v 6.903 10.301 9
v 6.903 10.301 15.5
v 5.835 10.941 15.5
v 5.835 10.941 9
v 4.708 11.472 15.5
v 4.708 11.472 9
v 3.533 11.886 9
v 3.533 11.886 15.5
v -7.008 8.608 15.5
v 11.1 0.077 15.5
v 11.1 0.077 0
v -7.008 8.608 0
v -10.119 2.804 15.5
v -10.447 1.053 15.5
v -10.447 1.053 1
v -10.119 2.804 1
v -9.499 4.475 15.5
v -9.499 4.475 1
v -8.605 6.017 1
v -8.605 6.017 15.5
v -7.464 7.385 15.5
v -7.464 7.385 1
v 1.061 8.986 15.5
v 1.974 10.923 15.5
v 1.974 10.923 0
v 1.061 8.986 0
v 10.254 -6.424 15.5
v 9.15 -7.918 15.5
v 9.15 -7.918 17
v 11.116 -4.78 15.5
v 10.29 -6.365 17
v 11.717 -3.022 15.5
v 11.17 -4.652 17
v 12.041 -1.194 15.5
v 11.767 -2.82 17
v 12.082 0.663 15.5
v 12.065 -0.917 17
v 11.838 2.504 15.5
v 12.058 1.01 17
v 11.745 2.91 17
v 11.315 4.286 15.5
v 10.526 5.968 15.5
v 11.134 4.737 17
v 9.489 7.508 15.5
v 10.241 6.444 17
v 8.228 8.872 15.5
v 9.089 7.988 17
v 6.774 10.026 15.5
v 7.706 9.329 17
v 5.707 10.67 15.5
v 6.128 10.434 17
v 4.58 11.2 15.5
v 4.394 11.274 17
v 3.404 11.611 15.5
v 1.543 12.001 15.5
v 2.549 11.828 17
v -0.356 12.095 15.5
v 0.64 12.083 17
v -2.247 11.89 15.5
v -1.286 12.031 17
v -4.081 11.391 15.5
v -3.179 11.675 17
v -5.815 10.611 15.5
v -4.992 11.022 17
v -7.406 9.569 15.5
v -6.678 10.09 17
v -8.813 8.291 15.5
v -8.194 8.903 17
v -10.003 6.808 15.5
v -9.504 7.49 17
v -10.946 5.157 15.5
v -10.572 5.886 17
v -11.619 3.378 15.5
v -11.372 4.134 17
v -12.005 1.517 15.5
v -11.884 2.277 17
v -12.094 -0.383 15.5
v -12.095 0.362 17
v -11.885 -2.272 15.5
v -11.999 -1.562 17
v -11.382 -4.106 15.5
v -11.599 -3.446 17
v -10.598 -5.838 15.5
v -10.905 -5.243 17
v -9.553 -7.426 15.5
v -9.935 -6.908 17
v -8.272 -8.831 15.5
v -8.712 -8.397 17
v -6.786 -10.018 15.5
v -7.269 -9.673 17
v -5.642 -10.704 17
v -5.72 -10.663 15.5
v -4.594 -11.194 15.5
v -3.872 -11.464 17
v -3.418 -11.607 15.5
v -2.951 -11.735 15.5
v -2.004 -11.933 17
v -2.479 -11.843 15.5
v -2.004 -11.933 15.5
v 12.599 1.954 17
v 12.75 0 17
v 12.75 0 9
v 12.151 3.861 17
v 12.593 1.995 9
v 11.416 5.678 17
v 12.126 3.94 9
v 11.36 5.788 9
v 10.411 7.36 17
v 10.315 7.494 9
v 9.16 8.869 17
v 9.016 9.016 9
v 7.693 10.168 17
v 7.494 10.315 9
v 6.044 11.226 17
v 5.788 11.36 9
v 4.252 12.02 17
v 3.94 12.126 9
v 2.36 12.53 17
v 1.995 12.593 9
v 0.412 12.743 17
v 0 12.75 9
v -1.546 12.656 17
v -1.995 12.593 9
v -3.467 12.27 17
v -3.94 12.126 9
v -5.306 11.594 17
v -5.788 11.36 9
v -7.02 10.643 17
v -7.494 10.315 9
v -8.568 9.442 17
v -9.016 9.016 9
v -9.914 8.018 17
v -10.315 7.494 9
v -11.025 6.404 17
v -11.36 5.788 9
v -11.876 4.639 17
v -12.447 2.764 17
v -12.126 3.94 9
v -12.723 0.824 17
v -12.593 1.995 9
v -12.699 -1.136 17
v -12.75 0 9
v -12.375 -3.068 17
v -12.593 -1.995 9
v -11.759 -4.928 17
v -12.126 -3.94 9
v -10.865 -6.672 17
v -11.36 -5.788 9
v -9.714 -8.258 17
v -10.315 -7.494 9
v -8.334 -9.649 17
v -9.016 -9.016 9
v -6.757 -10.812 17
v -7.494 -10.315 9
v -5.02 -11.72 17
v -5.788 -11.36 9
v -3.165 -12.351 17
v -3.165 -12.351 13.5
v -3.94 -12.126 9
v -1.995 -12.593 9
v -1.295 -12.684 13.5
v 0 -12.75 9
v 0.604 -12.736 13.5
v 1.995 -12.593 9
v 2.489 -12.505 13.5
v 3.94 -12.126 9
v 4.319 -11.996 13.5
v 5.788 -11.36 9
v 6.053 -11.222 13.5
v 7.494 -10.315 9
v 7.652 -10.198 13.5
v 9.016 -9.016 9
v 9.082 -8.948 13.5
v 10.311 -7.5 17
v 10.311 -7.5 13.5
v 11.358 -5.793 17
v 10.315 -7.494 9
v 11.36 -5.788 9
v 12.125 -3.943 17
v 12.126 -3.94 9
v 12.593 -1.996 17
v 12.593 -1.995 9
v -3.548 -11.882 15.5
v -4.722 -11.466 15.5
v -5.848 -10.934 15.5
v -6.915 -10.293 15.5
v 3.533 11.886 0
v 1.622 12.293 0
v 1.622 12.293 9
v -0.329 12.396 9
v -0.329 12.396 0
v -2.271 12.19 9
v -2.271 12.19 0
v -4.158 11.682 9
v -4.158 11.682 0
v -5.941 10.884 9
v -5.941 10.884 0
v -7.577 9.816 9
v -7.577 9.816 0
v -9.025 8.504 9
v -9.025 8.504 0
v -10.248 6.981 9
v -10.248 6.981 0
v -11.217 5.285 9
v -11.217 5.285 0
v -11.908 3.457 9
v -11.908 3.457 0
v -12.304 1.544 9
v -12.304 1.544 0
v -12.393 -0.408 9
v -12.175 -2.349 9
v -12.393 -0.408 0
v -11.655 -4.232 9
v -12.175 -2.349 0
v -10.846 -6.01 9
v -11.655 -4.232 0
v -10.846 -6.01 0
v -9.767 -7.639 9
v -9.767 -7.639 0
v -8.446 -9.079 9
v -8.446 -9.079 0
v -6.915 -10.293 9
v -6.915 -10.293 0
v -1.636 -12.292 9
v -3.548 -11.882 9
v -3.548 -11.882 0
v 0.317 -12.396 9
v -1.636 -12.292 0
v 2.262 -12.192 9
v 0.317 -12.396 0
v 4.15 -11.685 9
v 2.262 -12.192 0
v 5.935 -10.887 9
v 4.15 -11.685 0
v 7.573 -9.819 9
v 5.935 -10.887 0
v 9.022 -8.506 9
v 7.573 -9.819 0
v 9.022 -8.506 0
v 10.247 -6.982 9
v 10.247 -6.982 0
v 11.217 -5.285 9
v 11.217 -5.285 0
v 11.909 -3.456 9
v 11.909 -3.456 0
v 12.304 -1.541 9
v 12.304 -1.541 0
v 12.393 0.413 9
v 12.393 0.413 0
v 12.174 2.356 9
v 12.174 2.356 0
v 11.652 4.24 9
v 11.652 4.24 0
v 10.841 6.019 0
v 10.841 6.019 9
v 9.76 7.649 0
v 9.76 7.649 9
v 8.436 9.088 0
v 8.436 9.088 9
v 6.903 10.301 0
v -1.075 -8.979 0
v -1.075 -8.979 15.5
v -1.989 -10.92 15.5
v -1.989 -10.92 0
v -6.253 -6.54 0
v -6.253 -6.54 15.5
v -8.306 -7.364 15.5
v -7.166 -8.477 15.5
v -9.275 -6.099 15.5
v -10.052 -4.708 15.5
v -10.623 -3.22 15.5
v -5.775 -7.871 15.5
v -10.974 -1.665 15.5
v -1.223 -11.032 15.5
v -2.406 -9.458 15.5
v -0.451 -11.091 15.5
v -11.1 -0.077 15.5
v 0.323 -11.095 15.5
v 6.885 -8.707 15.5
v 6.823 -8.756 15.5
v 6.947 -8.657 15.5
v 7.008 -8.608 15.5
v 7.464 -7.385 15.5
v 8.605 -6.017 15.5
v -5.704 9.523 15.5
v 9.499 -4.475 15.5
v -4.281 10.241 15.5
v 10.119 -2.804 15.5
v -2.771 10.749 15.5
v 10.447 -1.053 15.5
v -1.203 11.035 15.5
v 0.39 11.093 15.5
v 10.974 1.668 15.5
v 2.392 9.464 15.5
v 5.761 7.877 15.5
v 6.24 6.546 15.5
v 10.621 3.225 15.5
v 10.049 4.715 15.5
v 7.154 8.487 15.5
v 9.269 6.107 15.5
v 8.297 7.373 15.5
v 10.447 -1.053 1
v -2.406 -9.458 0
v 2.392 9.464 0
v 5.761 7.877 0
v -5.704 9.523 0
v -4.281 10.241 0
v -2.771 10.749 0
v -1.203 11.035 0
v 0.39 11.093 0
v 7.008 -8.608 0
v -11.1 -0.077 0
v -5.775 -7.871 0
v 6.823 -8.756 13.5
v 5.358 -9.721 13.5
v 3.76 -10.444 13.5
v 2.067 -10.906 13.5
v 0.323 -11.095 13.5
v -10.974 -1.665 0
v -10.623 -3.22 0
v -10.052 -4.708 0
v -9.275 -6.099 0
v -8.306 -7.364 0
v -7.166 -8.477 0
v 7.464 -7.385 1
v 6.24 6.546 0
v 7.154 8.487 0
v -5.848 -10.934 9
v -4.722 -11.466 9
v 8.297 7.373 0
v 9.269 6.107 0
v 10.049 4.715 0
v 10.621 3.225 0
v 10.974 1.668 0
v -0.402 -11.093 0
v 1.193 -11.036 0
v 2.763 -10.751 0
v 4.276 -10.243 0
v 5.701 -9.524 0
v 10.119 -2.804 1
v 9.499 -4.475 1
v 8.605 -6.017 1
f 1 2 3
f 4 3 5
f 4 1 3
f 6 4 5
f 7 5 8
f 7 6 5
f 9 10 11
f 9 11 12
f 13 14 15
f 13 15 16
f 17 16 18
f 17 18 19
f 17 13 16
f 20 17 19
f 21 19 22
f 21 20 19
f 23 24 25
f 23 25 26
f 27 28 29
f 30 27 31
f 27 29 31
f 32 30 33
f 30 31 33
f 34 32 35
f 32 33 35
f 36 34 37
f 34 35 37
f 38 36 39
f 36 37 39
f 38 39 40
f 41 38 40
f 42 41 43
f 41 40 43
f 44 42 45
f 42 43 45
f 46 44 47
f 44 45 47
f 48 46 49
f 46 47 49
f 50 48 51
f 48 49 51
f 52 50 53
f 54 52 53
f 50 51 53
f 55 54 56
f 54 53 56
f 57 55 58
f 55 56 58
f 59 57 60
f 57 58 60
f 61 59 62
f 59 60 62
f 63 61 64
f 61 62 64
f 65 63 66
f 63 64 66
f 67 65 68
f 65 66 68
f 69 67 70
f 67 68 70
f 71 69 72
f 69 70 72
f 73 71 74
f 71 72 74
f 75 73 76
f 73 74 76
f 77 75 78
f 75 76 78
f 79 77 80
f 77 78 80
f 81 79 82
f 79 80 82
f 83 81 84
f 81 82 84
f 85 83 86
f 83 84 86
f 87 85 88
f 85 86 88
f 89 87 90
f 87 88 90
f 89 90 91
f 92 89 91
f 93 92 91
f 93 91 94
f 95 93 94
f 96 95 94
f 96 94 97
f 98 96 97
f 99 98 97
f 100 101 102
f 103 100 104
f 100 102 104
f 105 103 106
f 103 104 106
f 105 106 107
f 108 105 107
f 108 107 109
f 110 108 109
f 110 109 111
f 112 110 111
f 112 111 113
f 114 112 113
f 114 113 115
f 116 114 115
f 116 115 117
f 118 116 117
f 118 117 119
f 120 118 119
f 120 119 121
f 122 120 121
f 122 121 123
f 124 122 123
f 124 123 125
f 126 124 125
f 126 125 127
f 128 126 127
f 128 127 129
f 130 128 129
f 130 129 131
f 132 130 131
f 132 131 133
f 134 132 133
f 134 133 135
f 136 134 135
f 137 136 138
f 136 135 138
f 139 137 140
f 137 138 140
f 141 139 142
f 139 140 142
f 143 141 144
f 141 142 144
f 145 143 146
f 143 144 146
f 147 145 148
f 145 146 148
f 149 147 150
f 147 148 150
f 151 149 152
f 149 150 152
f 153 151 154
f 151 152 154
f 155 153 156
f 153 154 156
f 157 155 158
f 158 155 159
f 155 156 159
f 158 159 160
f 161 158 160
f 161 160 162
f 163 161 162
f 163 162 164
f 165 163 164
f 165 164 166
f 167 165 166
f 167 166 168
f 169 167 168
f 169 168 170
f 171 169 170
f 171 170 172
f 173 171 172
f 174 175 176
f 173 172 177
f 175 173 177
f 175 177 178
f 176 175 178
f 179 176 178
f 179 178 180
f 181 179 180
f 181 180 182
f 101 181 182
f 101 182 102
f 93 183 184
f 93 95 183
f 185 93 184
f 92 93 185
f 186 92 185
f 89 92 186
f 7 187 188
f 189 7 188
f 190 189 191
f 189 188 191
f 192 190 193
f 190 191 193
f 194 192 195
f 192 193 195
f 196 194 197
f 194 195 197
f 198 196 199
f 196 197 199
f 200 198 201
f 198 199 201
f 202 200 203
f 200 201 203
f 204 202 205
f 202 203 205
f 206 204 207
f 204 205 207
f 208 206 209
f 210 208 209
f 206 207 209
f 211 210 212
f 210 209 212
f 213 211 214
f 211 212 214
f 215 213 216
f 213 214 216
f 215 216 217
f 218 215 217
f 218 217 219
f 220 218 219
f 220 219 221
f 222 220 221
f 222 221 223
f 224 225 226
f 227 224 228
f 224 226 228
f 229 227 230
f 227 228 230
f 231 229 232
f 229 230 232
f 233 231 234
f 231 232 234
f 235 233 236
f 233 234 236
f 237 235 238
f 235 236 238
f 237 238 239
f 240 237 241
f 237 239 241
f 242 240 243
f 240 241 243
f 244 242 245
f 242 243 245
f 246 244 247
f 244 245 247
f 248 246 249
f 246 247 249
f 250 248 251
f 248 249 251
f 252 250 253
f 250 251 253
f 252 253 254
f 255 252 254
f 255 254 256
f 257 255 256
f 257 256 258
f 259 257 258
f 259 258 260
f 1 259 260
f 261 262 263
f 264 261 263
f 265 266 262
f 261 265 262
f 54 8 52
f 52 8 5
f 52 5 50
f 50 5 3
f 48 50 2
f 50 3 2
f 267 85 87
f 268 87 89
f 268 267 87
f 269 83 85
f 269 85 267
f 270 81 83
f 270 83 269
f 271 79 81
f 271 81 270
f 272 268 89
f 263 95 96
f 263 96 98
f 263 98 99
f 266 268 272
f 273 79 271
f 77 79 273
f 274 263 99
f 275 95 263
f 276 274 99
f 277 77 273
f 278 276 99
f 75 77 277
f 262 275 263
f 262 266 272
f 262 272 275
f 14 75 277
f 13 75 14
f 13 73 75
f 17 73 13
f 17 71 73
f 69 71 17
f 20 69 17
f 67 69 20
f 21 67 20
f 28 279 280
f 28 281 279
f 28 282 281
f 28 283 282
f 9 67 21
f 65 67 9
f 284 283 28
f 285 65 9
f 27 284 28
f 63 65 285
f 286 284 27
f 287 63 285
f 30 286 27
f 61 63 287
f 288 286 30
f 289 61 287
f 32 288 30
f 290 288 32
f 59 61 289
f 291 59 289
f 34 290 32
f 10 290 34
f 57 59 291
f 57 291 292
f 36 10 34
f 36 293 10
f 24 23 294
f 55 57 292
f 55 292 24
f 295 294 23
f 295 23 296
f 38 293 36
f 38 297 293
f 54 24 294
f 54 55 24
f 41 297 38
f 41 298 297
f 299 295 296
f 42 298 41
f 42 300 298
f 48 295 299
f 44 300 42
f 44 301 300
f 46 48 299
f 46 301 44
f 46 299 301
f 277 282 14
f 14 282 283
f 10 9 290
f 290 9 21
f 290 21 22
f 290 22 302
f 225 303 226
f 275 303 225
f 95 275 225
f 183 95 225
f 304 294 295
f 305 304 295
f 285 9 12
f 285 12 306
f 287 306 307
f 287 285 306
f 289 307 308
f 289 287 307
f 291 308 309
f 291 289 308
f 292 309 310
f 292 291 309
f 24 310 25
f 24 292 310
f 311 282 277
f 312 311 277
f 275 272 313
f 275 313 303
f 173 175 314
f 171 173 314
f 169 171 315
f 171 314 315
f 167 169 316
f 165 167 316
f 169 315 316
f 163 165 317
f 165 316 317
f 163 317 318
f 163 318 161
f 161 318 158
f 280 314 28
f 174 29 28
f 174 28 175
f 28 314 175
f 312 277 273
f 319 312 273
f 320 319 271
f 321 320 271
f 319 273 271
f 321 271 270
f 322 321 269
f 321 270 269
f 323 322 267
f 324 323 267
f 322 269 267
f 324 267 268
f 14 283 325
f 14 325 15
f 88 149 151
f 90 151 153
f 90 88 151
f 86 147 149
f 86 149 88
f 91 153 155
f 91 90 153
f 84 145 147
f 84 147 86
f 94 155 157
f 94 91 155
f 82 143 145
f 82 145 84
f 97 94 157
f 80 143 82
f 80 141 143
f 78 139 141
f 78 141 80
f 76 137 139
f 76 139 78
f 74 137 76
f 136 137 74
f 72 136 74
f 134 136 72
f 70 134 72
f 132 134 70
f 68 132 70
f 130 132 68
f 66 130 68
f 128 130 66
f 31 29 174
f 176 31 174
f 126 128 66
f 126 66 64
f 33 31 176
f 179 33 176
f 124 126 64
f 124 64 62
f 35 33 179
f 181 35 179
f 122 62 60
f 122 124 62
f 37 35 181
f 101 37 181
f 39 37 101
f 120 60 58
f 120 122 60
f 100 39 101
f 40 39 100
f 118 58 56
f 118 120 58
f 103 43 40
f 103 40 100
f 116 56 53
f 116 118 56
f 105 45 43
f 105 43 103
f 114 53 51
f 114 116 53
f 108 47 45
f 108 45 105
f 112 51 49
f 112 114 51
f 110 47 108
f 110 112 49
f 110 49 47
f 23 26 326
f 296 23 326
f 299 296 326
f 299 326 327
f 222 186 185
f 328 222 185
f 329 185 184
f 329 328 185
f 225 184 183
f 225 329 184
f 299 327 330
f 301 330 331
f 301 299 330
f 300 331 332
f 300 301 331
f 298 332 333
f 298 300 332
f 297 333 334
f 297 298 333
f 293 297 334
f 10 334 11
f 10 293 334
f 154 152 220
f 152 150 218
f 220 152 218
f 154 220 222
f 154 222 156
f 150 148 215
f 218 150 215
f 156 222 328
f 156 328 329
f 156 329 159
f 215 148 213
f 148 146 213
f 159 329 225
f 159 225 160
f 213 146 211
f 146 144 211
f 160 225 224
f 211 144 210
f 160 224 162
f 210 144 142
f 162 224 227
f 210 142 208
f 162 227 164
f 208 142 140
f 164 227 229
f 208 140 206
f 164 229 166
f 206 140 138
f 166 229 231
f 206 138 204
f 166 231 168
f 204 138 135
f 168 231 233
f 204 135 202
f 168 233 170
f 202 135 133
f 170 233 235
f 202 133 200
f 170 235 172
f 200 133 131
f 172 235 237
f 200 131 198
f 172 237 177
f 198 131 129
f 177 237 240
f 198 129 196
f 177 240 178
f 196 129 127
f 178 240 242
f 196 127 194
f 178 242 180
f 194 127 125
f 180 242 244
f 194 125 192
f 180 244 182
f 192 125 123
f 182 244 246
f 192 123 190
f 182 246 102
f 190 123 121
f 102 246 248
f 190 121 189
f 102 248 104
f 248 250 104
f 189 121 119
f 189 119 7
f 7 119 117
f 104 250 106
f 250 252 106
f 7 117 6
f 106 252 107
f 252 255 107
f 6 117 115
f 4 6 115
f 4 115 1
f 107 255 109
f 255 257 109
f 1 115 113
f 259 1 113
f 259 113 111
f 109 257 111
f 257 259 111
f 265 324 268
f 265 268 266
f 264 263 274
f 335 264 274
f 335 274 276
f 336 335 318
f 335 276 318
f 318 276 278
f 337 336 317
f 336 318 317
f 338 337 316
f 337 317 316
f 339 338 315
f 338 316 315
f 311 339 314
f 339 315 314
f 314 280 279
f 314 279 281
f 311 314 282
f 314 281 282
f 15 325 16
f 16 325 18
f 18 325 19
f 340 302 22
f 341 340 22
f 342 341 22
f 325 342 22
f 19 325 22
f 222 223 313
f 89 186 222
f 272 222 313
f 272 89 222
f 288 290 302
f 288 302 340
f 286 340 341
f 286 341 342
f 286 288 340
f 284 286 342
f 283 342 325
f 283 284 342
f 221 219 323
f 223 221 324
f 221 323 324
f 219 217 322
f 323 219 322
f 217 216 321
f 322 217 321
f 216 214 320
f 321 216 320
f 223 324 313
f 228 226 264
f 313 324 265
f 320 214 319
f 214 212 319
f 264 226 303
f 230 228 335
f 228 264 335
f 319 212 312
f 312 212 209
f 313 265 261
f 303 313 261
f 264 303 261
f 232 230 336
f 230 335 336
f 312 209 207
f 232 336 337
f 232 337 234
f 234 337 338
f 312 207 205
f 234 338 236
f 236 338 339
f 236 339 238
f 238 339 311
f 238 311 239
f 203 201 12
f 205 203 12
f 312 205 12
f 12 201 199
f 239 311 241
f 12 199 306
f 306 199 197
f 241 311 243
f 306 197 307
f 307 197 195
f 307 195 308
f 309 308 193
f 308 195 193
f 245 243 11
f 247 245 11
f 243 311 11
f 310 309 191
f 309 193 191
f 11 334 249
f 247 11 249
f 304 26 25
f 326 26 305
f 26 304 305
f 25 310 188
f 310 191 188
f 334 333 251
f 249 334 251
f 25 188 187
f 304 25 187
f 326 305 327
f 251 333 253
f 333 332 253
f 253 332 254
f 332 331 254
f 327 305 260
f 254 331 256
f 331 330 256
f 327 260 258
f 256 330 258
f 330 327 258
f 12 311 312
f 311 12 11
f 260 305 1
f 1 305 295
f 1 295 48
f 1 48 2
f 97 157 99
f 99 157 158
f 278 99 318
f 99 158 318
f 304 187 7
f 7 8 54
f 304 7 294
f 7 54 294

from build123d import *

# Parameters (mm, degrees)
SKETCH_1_R          = 12.4
EXTRUDE_1_DEPTH     = 17
SKETCH_2_R          = 12.1
CUT_EXTRUDE_1_DEPTH = 1.5
CUT_EXTRUDE_2_DEPTH = 24.404486749
EXTRUDE_START       = -8
SKETCH_4_R          = 12.75
SKETCH_4_R_2        = 12.4
EXTRUDE_2_DEPTH     = 8
CUT_EXTRUDE_3_DEPTH = 14.5
CUT_EXTRUDE_4_DEPTH = 24.777615524
CUT_EXTRUDE_START   = -3.5
CUT_EXTRUDE_5_DEPTH = 3.5


with BuildPart() as part:
    # 草图1 → 凸台-拉伸1 (new body)
    with BuildSketch(Plane.XY):
        Circle(SKETCH_1_R)
    extrude(amount=EXTRUDE_1_DEPTH)

    # 草图2 → 切除-拉伸1 (cut)
    with BuildSketch(Plane.XY.offset(17)):
        Circle(SKETCH_2_R)
    extrude(amount=-CUT_EXTRUDE_1_DEPTH, mode=Mode.SUBTRACT)

    # 草图3 → 切除-拉伸2 (cut, through all)
    with BuildSketch(Plane.XY.offset(15.5)):
        with BuildLine():
            Line((-6.915466109, -10.292537515), (-5.774584306, -7.870847726))
            Line((-5.774584306, -7.870847726), (-2.405724389, -9.457950665))
            Line((-2.405724389, -9.457950665), (-3.547574837, -11.881696544))
            ThreePointArc((-3.547574837, -11.881696544), (-5.291518031, -11.214269345), (-6.915466109, -10.292537515))
        make_face()
        with BuildLine():
            Line((5.761046975, 7.877225296), (6.902897424, 10.300971175))
            ThreePointArc((6.902897424, 10.300971175), (5.277825448, 11.220720055), (3.533068862, 11.886018022))
            Line((3.533068862, 11.886018022), (2.392187058, 9.464328234))
            Line((2.392187058, 9.464328234), (5.761046975, 7.877225296))
        make_face()
    extrude(amount=-CUT_EXTRUDE_2_DEPTH, mode=Mode.SUBTRACT)

    # 草图4 → 凸台-拉伸2 (add)
    with BuildSketch(Plane.XY.offset(17).offset(EXTRUDE_START)):
        Circle(SKETCH_4_R)
        Circle(SKETCH_4_R_2, mode=Mode.SUBTRACT)
    extrude(amount=EXTRUDE_2_DEPTH)

    # 草图5 → 切除-拉伸3 (cut)
    with BuildSketch(Plane.XY.offset(15.5)):
        with BuildLine():
            Line((-7.463806301, 7.385228195), (10.44708929, -1.05277033))
            ThreePointArc((10.44708929, -1.05277033), (9.498686797, -4.474924483), (7.463806301, -7.385228195))
            Line((7.463806301, -7.385228195), (-10.44708929, 1.05277033))
            ThreePointArc((-10.44708929, 1.05277033), (-9.498686797, 4.474924483), (-7.463806301, 7.385228195))
        make_face()
    extrude(amount=-CUT_EXTRUDE_3_DEPTH, mode=Mode.SUBTRACT)

    # 草图6 → 切除-拉伸4 (cut, through all)
    with BuildSketch(Plane.XY.offset(15.5)):
        with BuildLine():
            Line((11.09973429, 0.076802961), (-7.008374763, 8.607710682))
            ThreePointArc((-7.008374763, 8.607710682), (-2.770642176, 10.748653029), (1.973996084, 10.923064564))
            Line((1.973996084, 10.923064564), (1.061366936, 8.98587468))
            Line((1.061366936, 8.98587468), (6.239500529, 6.546405174))
            Line((6.239500529, 6.546405174), (7.153831598, 8.487207636))
            ThreePointArc((7.153831598, 8.487207636), (10.048974754, 4.714669277), (11.09973429, 0.076802961))
        make_face()
        with BuildLine():
            Line((7.008374763, -8.607710682), (-11.09973429, -0.076802961))
            ThreePointArc((-11.09973429, -0.076802961), (-10.052261546, -4.707657359), (-7.165667007, -8.477217488))
            Line((-7.165667007, -8.477217488), (-6.253037859, -6.540027604))
            Line((-6.253037859, -6.540027604), (-1.074904267, -8.979497111))
            Line((-1.074904267, -8.979497111), (-1.989235336, -10.920299574))
            ThreePointArc((-1.989235336, -10.920299574), (2.763142593, -10.75058338), (7.008374763, -8.607710682))
        make_face()
    extrude(amount=-CUT_EXTRUDE_4_DEPTH, mode=Mode.SUBTRACT)

    # 草图7 → 切除-拉伸5 (cut)
    with BuildSketch(Plane.XY.offset(17).offset(CUT_EXTRUDE_START)):
        with BuildLine():
            Line((-3.16472158, -12.350993374), (10.31093311, -7.499810558))
            ThreePointArc((10.31093311, -7.499810558), (4.318631553, -11.996329502), (-3.16472158, -12.350993374))
        make_face()
    extrude(amount=CUT_EXTRUDE_5_DEPTH, mode=Mode.SUBTRACT)


solid = part.part
